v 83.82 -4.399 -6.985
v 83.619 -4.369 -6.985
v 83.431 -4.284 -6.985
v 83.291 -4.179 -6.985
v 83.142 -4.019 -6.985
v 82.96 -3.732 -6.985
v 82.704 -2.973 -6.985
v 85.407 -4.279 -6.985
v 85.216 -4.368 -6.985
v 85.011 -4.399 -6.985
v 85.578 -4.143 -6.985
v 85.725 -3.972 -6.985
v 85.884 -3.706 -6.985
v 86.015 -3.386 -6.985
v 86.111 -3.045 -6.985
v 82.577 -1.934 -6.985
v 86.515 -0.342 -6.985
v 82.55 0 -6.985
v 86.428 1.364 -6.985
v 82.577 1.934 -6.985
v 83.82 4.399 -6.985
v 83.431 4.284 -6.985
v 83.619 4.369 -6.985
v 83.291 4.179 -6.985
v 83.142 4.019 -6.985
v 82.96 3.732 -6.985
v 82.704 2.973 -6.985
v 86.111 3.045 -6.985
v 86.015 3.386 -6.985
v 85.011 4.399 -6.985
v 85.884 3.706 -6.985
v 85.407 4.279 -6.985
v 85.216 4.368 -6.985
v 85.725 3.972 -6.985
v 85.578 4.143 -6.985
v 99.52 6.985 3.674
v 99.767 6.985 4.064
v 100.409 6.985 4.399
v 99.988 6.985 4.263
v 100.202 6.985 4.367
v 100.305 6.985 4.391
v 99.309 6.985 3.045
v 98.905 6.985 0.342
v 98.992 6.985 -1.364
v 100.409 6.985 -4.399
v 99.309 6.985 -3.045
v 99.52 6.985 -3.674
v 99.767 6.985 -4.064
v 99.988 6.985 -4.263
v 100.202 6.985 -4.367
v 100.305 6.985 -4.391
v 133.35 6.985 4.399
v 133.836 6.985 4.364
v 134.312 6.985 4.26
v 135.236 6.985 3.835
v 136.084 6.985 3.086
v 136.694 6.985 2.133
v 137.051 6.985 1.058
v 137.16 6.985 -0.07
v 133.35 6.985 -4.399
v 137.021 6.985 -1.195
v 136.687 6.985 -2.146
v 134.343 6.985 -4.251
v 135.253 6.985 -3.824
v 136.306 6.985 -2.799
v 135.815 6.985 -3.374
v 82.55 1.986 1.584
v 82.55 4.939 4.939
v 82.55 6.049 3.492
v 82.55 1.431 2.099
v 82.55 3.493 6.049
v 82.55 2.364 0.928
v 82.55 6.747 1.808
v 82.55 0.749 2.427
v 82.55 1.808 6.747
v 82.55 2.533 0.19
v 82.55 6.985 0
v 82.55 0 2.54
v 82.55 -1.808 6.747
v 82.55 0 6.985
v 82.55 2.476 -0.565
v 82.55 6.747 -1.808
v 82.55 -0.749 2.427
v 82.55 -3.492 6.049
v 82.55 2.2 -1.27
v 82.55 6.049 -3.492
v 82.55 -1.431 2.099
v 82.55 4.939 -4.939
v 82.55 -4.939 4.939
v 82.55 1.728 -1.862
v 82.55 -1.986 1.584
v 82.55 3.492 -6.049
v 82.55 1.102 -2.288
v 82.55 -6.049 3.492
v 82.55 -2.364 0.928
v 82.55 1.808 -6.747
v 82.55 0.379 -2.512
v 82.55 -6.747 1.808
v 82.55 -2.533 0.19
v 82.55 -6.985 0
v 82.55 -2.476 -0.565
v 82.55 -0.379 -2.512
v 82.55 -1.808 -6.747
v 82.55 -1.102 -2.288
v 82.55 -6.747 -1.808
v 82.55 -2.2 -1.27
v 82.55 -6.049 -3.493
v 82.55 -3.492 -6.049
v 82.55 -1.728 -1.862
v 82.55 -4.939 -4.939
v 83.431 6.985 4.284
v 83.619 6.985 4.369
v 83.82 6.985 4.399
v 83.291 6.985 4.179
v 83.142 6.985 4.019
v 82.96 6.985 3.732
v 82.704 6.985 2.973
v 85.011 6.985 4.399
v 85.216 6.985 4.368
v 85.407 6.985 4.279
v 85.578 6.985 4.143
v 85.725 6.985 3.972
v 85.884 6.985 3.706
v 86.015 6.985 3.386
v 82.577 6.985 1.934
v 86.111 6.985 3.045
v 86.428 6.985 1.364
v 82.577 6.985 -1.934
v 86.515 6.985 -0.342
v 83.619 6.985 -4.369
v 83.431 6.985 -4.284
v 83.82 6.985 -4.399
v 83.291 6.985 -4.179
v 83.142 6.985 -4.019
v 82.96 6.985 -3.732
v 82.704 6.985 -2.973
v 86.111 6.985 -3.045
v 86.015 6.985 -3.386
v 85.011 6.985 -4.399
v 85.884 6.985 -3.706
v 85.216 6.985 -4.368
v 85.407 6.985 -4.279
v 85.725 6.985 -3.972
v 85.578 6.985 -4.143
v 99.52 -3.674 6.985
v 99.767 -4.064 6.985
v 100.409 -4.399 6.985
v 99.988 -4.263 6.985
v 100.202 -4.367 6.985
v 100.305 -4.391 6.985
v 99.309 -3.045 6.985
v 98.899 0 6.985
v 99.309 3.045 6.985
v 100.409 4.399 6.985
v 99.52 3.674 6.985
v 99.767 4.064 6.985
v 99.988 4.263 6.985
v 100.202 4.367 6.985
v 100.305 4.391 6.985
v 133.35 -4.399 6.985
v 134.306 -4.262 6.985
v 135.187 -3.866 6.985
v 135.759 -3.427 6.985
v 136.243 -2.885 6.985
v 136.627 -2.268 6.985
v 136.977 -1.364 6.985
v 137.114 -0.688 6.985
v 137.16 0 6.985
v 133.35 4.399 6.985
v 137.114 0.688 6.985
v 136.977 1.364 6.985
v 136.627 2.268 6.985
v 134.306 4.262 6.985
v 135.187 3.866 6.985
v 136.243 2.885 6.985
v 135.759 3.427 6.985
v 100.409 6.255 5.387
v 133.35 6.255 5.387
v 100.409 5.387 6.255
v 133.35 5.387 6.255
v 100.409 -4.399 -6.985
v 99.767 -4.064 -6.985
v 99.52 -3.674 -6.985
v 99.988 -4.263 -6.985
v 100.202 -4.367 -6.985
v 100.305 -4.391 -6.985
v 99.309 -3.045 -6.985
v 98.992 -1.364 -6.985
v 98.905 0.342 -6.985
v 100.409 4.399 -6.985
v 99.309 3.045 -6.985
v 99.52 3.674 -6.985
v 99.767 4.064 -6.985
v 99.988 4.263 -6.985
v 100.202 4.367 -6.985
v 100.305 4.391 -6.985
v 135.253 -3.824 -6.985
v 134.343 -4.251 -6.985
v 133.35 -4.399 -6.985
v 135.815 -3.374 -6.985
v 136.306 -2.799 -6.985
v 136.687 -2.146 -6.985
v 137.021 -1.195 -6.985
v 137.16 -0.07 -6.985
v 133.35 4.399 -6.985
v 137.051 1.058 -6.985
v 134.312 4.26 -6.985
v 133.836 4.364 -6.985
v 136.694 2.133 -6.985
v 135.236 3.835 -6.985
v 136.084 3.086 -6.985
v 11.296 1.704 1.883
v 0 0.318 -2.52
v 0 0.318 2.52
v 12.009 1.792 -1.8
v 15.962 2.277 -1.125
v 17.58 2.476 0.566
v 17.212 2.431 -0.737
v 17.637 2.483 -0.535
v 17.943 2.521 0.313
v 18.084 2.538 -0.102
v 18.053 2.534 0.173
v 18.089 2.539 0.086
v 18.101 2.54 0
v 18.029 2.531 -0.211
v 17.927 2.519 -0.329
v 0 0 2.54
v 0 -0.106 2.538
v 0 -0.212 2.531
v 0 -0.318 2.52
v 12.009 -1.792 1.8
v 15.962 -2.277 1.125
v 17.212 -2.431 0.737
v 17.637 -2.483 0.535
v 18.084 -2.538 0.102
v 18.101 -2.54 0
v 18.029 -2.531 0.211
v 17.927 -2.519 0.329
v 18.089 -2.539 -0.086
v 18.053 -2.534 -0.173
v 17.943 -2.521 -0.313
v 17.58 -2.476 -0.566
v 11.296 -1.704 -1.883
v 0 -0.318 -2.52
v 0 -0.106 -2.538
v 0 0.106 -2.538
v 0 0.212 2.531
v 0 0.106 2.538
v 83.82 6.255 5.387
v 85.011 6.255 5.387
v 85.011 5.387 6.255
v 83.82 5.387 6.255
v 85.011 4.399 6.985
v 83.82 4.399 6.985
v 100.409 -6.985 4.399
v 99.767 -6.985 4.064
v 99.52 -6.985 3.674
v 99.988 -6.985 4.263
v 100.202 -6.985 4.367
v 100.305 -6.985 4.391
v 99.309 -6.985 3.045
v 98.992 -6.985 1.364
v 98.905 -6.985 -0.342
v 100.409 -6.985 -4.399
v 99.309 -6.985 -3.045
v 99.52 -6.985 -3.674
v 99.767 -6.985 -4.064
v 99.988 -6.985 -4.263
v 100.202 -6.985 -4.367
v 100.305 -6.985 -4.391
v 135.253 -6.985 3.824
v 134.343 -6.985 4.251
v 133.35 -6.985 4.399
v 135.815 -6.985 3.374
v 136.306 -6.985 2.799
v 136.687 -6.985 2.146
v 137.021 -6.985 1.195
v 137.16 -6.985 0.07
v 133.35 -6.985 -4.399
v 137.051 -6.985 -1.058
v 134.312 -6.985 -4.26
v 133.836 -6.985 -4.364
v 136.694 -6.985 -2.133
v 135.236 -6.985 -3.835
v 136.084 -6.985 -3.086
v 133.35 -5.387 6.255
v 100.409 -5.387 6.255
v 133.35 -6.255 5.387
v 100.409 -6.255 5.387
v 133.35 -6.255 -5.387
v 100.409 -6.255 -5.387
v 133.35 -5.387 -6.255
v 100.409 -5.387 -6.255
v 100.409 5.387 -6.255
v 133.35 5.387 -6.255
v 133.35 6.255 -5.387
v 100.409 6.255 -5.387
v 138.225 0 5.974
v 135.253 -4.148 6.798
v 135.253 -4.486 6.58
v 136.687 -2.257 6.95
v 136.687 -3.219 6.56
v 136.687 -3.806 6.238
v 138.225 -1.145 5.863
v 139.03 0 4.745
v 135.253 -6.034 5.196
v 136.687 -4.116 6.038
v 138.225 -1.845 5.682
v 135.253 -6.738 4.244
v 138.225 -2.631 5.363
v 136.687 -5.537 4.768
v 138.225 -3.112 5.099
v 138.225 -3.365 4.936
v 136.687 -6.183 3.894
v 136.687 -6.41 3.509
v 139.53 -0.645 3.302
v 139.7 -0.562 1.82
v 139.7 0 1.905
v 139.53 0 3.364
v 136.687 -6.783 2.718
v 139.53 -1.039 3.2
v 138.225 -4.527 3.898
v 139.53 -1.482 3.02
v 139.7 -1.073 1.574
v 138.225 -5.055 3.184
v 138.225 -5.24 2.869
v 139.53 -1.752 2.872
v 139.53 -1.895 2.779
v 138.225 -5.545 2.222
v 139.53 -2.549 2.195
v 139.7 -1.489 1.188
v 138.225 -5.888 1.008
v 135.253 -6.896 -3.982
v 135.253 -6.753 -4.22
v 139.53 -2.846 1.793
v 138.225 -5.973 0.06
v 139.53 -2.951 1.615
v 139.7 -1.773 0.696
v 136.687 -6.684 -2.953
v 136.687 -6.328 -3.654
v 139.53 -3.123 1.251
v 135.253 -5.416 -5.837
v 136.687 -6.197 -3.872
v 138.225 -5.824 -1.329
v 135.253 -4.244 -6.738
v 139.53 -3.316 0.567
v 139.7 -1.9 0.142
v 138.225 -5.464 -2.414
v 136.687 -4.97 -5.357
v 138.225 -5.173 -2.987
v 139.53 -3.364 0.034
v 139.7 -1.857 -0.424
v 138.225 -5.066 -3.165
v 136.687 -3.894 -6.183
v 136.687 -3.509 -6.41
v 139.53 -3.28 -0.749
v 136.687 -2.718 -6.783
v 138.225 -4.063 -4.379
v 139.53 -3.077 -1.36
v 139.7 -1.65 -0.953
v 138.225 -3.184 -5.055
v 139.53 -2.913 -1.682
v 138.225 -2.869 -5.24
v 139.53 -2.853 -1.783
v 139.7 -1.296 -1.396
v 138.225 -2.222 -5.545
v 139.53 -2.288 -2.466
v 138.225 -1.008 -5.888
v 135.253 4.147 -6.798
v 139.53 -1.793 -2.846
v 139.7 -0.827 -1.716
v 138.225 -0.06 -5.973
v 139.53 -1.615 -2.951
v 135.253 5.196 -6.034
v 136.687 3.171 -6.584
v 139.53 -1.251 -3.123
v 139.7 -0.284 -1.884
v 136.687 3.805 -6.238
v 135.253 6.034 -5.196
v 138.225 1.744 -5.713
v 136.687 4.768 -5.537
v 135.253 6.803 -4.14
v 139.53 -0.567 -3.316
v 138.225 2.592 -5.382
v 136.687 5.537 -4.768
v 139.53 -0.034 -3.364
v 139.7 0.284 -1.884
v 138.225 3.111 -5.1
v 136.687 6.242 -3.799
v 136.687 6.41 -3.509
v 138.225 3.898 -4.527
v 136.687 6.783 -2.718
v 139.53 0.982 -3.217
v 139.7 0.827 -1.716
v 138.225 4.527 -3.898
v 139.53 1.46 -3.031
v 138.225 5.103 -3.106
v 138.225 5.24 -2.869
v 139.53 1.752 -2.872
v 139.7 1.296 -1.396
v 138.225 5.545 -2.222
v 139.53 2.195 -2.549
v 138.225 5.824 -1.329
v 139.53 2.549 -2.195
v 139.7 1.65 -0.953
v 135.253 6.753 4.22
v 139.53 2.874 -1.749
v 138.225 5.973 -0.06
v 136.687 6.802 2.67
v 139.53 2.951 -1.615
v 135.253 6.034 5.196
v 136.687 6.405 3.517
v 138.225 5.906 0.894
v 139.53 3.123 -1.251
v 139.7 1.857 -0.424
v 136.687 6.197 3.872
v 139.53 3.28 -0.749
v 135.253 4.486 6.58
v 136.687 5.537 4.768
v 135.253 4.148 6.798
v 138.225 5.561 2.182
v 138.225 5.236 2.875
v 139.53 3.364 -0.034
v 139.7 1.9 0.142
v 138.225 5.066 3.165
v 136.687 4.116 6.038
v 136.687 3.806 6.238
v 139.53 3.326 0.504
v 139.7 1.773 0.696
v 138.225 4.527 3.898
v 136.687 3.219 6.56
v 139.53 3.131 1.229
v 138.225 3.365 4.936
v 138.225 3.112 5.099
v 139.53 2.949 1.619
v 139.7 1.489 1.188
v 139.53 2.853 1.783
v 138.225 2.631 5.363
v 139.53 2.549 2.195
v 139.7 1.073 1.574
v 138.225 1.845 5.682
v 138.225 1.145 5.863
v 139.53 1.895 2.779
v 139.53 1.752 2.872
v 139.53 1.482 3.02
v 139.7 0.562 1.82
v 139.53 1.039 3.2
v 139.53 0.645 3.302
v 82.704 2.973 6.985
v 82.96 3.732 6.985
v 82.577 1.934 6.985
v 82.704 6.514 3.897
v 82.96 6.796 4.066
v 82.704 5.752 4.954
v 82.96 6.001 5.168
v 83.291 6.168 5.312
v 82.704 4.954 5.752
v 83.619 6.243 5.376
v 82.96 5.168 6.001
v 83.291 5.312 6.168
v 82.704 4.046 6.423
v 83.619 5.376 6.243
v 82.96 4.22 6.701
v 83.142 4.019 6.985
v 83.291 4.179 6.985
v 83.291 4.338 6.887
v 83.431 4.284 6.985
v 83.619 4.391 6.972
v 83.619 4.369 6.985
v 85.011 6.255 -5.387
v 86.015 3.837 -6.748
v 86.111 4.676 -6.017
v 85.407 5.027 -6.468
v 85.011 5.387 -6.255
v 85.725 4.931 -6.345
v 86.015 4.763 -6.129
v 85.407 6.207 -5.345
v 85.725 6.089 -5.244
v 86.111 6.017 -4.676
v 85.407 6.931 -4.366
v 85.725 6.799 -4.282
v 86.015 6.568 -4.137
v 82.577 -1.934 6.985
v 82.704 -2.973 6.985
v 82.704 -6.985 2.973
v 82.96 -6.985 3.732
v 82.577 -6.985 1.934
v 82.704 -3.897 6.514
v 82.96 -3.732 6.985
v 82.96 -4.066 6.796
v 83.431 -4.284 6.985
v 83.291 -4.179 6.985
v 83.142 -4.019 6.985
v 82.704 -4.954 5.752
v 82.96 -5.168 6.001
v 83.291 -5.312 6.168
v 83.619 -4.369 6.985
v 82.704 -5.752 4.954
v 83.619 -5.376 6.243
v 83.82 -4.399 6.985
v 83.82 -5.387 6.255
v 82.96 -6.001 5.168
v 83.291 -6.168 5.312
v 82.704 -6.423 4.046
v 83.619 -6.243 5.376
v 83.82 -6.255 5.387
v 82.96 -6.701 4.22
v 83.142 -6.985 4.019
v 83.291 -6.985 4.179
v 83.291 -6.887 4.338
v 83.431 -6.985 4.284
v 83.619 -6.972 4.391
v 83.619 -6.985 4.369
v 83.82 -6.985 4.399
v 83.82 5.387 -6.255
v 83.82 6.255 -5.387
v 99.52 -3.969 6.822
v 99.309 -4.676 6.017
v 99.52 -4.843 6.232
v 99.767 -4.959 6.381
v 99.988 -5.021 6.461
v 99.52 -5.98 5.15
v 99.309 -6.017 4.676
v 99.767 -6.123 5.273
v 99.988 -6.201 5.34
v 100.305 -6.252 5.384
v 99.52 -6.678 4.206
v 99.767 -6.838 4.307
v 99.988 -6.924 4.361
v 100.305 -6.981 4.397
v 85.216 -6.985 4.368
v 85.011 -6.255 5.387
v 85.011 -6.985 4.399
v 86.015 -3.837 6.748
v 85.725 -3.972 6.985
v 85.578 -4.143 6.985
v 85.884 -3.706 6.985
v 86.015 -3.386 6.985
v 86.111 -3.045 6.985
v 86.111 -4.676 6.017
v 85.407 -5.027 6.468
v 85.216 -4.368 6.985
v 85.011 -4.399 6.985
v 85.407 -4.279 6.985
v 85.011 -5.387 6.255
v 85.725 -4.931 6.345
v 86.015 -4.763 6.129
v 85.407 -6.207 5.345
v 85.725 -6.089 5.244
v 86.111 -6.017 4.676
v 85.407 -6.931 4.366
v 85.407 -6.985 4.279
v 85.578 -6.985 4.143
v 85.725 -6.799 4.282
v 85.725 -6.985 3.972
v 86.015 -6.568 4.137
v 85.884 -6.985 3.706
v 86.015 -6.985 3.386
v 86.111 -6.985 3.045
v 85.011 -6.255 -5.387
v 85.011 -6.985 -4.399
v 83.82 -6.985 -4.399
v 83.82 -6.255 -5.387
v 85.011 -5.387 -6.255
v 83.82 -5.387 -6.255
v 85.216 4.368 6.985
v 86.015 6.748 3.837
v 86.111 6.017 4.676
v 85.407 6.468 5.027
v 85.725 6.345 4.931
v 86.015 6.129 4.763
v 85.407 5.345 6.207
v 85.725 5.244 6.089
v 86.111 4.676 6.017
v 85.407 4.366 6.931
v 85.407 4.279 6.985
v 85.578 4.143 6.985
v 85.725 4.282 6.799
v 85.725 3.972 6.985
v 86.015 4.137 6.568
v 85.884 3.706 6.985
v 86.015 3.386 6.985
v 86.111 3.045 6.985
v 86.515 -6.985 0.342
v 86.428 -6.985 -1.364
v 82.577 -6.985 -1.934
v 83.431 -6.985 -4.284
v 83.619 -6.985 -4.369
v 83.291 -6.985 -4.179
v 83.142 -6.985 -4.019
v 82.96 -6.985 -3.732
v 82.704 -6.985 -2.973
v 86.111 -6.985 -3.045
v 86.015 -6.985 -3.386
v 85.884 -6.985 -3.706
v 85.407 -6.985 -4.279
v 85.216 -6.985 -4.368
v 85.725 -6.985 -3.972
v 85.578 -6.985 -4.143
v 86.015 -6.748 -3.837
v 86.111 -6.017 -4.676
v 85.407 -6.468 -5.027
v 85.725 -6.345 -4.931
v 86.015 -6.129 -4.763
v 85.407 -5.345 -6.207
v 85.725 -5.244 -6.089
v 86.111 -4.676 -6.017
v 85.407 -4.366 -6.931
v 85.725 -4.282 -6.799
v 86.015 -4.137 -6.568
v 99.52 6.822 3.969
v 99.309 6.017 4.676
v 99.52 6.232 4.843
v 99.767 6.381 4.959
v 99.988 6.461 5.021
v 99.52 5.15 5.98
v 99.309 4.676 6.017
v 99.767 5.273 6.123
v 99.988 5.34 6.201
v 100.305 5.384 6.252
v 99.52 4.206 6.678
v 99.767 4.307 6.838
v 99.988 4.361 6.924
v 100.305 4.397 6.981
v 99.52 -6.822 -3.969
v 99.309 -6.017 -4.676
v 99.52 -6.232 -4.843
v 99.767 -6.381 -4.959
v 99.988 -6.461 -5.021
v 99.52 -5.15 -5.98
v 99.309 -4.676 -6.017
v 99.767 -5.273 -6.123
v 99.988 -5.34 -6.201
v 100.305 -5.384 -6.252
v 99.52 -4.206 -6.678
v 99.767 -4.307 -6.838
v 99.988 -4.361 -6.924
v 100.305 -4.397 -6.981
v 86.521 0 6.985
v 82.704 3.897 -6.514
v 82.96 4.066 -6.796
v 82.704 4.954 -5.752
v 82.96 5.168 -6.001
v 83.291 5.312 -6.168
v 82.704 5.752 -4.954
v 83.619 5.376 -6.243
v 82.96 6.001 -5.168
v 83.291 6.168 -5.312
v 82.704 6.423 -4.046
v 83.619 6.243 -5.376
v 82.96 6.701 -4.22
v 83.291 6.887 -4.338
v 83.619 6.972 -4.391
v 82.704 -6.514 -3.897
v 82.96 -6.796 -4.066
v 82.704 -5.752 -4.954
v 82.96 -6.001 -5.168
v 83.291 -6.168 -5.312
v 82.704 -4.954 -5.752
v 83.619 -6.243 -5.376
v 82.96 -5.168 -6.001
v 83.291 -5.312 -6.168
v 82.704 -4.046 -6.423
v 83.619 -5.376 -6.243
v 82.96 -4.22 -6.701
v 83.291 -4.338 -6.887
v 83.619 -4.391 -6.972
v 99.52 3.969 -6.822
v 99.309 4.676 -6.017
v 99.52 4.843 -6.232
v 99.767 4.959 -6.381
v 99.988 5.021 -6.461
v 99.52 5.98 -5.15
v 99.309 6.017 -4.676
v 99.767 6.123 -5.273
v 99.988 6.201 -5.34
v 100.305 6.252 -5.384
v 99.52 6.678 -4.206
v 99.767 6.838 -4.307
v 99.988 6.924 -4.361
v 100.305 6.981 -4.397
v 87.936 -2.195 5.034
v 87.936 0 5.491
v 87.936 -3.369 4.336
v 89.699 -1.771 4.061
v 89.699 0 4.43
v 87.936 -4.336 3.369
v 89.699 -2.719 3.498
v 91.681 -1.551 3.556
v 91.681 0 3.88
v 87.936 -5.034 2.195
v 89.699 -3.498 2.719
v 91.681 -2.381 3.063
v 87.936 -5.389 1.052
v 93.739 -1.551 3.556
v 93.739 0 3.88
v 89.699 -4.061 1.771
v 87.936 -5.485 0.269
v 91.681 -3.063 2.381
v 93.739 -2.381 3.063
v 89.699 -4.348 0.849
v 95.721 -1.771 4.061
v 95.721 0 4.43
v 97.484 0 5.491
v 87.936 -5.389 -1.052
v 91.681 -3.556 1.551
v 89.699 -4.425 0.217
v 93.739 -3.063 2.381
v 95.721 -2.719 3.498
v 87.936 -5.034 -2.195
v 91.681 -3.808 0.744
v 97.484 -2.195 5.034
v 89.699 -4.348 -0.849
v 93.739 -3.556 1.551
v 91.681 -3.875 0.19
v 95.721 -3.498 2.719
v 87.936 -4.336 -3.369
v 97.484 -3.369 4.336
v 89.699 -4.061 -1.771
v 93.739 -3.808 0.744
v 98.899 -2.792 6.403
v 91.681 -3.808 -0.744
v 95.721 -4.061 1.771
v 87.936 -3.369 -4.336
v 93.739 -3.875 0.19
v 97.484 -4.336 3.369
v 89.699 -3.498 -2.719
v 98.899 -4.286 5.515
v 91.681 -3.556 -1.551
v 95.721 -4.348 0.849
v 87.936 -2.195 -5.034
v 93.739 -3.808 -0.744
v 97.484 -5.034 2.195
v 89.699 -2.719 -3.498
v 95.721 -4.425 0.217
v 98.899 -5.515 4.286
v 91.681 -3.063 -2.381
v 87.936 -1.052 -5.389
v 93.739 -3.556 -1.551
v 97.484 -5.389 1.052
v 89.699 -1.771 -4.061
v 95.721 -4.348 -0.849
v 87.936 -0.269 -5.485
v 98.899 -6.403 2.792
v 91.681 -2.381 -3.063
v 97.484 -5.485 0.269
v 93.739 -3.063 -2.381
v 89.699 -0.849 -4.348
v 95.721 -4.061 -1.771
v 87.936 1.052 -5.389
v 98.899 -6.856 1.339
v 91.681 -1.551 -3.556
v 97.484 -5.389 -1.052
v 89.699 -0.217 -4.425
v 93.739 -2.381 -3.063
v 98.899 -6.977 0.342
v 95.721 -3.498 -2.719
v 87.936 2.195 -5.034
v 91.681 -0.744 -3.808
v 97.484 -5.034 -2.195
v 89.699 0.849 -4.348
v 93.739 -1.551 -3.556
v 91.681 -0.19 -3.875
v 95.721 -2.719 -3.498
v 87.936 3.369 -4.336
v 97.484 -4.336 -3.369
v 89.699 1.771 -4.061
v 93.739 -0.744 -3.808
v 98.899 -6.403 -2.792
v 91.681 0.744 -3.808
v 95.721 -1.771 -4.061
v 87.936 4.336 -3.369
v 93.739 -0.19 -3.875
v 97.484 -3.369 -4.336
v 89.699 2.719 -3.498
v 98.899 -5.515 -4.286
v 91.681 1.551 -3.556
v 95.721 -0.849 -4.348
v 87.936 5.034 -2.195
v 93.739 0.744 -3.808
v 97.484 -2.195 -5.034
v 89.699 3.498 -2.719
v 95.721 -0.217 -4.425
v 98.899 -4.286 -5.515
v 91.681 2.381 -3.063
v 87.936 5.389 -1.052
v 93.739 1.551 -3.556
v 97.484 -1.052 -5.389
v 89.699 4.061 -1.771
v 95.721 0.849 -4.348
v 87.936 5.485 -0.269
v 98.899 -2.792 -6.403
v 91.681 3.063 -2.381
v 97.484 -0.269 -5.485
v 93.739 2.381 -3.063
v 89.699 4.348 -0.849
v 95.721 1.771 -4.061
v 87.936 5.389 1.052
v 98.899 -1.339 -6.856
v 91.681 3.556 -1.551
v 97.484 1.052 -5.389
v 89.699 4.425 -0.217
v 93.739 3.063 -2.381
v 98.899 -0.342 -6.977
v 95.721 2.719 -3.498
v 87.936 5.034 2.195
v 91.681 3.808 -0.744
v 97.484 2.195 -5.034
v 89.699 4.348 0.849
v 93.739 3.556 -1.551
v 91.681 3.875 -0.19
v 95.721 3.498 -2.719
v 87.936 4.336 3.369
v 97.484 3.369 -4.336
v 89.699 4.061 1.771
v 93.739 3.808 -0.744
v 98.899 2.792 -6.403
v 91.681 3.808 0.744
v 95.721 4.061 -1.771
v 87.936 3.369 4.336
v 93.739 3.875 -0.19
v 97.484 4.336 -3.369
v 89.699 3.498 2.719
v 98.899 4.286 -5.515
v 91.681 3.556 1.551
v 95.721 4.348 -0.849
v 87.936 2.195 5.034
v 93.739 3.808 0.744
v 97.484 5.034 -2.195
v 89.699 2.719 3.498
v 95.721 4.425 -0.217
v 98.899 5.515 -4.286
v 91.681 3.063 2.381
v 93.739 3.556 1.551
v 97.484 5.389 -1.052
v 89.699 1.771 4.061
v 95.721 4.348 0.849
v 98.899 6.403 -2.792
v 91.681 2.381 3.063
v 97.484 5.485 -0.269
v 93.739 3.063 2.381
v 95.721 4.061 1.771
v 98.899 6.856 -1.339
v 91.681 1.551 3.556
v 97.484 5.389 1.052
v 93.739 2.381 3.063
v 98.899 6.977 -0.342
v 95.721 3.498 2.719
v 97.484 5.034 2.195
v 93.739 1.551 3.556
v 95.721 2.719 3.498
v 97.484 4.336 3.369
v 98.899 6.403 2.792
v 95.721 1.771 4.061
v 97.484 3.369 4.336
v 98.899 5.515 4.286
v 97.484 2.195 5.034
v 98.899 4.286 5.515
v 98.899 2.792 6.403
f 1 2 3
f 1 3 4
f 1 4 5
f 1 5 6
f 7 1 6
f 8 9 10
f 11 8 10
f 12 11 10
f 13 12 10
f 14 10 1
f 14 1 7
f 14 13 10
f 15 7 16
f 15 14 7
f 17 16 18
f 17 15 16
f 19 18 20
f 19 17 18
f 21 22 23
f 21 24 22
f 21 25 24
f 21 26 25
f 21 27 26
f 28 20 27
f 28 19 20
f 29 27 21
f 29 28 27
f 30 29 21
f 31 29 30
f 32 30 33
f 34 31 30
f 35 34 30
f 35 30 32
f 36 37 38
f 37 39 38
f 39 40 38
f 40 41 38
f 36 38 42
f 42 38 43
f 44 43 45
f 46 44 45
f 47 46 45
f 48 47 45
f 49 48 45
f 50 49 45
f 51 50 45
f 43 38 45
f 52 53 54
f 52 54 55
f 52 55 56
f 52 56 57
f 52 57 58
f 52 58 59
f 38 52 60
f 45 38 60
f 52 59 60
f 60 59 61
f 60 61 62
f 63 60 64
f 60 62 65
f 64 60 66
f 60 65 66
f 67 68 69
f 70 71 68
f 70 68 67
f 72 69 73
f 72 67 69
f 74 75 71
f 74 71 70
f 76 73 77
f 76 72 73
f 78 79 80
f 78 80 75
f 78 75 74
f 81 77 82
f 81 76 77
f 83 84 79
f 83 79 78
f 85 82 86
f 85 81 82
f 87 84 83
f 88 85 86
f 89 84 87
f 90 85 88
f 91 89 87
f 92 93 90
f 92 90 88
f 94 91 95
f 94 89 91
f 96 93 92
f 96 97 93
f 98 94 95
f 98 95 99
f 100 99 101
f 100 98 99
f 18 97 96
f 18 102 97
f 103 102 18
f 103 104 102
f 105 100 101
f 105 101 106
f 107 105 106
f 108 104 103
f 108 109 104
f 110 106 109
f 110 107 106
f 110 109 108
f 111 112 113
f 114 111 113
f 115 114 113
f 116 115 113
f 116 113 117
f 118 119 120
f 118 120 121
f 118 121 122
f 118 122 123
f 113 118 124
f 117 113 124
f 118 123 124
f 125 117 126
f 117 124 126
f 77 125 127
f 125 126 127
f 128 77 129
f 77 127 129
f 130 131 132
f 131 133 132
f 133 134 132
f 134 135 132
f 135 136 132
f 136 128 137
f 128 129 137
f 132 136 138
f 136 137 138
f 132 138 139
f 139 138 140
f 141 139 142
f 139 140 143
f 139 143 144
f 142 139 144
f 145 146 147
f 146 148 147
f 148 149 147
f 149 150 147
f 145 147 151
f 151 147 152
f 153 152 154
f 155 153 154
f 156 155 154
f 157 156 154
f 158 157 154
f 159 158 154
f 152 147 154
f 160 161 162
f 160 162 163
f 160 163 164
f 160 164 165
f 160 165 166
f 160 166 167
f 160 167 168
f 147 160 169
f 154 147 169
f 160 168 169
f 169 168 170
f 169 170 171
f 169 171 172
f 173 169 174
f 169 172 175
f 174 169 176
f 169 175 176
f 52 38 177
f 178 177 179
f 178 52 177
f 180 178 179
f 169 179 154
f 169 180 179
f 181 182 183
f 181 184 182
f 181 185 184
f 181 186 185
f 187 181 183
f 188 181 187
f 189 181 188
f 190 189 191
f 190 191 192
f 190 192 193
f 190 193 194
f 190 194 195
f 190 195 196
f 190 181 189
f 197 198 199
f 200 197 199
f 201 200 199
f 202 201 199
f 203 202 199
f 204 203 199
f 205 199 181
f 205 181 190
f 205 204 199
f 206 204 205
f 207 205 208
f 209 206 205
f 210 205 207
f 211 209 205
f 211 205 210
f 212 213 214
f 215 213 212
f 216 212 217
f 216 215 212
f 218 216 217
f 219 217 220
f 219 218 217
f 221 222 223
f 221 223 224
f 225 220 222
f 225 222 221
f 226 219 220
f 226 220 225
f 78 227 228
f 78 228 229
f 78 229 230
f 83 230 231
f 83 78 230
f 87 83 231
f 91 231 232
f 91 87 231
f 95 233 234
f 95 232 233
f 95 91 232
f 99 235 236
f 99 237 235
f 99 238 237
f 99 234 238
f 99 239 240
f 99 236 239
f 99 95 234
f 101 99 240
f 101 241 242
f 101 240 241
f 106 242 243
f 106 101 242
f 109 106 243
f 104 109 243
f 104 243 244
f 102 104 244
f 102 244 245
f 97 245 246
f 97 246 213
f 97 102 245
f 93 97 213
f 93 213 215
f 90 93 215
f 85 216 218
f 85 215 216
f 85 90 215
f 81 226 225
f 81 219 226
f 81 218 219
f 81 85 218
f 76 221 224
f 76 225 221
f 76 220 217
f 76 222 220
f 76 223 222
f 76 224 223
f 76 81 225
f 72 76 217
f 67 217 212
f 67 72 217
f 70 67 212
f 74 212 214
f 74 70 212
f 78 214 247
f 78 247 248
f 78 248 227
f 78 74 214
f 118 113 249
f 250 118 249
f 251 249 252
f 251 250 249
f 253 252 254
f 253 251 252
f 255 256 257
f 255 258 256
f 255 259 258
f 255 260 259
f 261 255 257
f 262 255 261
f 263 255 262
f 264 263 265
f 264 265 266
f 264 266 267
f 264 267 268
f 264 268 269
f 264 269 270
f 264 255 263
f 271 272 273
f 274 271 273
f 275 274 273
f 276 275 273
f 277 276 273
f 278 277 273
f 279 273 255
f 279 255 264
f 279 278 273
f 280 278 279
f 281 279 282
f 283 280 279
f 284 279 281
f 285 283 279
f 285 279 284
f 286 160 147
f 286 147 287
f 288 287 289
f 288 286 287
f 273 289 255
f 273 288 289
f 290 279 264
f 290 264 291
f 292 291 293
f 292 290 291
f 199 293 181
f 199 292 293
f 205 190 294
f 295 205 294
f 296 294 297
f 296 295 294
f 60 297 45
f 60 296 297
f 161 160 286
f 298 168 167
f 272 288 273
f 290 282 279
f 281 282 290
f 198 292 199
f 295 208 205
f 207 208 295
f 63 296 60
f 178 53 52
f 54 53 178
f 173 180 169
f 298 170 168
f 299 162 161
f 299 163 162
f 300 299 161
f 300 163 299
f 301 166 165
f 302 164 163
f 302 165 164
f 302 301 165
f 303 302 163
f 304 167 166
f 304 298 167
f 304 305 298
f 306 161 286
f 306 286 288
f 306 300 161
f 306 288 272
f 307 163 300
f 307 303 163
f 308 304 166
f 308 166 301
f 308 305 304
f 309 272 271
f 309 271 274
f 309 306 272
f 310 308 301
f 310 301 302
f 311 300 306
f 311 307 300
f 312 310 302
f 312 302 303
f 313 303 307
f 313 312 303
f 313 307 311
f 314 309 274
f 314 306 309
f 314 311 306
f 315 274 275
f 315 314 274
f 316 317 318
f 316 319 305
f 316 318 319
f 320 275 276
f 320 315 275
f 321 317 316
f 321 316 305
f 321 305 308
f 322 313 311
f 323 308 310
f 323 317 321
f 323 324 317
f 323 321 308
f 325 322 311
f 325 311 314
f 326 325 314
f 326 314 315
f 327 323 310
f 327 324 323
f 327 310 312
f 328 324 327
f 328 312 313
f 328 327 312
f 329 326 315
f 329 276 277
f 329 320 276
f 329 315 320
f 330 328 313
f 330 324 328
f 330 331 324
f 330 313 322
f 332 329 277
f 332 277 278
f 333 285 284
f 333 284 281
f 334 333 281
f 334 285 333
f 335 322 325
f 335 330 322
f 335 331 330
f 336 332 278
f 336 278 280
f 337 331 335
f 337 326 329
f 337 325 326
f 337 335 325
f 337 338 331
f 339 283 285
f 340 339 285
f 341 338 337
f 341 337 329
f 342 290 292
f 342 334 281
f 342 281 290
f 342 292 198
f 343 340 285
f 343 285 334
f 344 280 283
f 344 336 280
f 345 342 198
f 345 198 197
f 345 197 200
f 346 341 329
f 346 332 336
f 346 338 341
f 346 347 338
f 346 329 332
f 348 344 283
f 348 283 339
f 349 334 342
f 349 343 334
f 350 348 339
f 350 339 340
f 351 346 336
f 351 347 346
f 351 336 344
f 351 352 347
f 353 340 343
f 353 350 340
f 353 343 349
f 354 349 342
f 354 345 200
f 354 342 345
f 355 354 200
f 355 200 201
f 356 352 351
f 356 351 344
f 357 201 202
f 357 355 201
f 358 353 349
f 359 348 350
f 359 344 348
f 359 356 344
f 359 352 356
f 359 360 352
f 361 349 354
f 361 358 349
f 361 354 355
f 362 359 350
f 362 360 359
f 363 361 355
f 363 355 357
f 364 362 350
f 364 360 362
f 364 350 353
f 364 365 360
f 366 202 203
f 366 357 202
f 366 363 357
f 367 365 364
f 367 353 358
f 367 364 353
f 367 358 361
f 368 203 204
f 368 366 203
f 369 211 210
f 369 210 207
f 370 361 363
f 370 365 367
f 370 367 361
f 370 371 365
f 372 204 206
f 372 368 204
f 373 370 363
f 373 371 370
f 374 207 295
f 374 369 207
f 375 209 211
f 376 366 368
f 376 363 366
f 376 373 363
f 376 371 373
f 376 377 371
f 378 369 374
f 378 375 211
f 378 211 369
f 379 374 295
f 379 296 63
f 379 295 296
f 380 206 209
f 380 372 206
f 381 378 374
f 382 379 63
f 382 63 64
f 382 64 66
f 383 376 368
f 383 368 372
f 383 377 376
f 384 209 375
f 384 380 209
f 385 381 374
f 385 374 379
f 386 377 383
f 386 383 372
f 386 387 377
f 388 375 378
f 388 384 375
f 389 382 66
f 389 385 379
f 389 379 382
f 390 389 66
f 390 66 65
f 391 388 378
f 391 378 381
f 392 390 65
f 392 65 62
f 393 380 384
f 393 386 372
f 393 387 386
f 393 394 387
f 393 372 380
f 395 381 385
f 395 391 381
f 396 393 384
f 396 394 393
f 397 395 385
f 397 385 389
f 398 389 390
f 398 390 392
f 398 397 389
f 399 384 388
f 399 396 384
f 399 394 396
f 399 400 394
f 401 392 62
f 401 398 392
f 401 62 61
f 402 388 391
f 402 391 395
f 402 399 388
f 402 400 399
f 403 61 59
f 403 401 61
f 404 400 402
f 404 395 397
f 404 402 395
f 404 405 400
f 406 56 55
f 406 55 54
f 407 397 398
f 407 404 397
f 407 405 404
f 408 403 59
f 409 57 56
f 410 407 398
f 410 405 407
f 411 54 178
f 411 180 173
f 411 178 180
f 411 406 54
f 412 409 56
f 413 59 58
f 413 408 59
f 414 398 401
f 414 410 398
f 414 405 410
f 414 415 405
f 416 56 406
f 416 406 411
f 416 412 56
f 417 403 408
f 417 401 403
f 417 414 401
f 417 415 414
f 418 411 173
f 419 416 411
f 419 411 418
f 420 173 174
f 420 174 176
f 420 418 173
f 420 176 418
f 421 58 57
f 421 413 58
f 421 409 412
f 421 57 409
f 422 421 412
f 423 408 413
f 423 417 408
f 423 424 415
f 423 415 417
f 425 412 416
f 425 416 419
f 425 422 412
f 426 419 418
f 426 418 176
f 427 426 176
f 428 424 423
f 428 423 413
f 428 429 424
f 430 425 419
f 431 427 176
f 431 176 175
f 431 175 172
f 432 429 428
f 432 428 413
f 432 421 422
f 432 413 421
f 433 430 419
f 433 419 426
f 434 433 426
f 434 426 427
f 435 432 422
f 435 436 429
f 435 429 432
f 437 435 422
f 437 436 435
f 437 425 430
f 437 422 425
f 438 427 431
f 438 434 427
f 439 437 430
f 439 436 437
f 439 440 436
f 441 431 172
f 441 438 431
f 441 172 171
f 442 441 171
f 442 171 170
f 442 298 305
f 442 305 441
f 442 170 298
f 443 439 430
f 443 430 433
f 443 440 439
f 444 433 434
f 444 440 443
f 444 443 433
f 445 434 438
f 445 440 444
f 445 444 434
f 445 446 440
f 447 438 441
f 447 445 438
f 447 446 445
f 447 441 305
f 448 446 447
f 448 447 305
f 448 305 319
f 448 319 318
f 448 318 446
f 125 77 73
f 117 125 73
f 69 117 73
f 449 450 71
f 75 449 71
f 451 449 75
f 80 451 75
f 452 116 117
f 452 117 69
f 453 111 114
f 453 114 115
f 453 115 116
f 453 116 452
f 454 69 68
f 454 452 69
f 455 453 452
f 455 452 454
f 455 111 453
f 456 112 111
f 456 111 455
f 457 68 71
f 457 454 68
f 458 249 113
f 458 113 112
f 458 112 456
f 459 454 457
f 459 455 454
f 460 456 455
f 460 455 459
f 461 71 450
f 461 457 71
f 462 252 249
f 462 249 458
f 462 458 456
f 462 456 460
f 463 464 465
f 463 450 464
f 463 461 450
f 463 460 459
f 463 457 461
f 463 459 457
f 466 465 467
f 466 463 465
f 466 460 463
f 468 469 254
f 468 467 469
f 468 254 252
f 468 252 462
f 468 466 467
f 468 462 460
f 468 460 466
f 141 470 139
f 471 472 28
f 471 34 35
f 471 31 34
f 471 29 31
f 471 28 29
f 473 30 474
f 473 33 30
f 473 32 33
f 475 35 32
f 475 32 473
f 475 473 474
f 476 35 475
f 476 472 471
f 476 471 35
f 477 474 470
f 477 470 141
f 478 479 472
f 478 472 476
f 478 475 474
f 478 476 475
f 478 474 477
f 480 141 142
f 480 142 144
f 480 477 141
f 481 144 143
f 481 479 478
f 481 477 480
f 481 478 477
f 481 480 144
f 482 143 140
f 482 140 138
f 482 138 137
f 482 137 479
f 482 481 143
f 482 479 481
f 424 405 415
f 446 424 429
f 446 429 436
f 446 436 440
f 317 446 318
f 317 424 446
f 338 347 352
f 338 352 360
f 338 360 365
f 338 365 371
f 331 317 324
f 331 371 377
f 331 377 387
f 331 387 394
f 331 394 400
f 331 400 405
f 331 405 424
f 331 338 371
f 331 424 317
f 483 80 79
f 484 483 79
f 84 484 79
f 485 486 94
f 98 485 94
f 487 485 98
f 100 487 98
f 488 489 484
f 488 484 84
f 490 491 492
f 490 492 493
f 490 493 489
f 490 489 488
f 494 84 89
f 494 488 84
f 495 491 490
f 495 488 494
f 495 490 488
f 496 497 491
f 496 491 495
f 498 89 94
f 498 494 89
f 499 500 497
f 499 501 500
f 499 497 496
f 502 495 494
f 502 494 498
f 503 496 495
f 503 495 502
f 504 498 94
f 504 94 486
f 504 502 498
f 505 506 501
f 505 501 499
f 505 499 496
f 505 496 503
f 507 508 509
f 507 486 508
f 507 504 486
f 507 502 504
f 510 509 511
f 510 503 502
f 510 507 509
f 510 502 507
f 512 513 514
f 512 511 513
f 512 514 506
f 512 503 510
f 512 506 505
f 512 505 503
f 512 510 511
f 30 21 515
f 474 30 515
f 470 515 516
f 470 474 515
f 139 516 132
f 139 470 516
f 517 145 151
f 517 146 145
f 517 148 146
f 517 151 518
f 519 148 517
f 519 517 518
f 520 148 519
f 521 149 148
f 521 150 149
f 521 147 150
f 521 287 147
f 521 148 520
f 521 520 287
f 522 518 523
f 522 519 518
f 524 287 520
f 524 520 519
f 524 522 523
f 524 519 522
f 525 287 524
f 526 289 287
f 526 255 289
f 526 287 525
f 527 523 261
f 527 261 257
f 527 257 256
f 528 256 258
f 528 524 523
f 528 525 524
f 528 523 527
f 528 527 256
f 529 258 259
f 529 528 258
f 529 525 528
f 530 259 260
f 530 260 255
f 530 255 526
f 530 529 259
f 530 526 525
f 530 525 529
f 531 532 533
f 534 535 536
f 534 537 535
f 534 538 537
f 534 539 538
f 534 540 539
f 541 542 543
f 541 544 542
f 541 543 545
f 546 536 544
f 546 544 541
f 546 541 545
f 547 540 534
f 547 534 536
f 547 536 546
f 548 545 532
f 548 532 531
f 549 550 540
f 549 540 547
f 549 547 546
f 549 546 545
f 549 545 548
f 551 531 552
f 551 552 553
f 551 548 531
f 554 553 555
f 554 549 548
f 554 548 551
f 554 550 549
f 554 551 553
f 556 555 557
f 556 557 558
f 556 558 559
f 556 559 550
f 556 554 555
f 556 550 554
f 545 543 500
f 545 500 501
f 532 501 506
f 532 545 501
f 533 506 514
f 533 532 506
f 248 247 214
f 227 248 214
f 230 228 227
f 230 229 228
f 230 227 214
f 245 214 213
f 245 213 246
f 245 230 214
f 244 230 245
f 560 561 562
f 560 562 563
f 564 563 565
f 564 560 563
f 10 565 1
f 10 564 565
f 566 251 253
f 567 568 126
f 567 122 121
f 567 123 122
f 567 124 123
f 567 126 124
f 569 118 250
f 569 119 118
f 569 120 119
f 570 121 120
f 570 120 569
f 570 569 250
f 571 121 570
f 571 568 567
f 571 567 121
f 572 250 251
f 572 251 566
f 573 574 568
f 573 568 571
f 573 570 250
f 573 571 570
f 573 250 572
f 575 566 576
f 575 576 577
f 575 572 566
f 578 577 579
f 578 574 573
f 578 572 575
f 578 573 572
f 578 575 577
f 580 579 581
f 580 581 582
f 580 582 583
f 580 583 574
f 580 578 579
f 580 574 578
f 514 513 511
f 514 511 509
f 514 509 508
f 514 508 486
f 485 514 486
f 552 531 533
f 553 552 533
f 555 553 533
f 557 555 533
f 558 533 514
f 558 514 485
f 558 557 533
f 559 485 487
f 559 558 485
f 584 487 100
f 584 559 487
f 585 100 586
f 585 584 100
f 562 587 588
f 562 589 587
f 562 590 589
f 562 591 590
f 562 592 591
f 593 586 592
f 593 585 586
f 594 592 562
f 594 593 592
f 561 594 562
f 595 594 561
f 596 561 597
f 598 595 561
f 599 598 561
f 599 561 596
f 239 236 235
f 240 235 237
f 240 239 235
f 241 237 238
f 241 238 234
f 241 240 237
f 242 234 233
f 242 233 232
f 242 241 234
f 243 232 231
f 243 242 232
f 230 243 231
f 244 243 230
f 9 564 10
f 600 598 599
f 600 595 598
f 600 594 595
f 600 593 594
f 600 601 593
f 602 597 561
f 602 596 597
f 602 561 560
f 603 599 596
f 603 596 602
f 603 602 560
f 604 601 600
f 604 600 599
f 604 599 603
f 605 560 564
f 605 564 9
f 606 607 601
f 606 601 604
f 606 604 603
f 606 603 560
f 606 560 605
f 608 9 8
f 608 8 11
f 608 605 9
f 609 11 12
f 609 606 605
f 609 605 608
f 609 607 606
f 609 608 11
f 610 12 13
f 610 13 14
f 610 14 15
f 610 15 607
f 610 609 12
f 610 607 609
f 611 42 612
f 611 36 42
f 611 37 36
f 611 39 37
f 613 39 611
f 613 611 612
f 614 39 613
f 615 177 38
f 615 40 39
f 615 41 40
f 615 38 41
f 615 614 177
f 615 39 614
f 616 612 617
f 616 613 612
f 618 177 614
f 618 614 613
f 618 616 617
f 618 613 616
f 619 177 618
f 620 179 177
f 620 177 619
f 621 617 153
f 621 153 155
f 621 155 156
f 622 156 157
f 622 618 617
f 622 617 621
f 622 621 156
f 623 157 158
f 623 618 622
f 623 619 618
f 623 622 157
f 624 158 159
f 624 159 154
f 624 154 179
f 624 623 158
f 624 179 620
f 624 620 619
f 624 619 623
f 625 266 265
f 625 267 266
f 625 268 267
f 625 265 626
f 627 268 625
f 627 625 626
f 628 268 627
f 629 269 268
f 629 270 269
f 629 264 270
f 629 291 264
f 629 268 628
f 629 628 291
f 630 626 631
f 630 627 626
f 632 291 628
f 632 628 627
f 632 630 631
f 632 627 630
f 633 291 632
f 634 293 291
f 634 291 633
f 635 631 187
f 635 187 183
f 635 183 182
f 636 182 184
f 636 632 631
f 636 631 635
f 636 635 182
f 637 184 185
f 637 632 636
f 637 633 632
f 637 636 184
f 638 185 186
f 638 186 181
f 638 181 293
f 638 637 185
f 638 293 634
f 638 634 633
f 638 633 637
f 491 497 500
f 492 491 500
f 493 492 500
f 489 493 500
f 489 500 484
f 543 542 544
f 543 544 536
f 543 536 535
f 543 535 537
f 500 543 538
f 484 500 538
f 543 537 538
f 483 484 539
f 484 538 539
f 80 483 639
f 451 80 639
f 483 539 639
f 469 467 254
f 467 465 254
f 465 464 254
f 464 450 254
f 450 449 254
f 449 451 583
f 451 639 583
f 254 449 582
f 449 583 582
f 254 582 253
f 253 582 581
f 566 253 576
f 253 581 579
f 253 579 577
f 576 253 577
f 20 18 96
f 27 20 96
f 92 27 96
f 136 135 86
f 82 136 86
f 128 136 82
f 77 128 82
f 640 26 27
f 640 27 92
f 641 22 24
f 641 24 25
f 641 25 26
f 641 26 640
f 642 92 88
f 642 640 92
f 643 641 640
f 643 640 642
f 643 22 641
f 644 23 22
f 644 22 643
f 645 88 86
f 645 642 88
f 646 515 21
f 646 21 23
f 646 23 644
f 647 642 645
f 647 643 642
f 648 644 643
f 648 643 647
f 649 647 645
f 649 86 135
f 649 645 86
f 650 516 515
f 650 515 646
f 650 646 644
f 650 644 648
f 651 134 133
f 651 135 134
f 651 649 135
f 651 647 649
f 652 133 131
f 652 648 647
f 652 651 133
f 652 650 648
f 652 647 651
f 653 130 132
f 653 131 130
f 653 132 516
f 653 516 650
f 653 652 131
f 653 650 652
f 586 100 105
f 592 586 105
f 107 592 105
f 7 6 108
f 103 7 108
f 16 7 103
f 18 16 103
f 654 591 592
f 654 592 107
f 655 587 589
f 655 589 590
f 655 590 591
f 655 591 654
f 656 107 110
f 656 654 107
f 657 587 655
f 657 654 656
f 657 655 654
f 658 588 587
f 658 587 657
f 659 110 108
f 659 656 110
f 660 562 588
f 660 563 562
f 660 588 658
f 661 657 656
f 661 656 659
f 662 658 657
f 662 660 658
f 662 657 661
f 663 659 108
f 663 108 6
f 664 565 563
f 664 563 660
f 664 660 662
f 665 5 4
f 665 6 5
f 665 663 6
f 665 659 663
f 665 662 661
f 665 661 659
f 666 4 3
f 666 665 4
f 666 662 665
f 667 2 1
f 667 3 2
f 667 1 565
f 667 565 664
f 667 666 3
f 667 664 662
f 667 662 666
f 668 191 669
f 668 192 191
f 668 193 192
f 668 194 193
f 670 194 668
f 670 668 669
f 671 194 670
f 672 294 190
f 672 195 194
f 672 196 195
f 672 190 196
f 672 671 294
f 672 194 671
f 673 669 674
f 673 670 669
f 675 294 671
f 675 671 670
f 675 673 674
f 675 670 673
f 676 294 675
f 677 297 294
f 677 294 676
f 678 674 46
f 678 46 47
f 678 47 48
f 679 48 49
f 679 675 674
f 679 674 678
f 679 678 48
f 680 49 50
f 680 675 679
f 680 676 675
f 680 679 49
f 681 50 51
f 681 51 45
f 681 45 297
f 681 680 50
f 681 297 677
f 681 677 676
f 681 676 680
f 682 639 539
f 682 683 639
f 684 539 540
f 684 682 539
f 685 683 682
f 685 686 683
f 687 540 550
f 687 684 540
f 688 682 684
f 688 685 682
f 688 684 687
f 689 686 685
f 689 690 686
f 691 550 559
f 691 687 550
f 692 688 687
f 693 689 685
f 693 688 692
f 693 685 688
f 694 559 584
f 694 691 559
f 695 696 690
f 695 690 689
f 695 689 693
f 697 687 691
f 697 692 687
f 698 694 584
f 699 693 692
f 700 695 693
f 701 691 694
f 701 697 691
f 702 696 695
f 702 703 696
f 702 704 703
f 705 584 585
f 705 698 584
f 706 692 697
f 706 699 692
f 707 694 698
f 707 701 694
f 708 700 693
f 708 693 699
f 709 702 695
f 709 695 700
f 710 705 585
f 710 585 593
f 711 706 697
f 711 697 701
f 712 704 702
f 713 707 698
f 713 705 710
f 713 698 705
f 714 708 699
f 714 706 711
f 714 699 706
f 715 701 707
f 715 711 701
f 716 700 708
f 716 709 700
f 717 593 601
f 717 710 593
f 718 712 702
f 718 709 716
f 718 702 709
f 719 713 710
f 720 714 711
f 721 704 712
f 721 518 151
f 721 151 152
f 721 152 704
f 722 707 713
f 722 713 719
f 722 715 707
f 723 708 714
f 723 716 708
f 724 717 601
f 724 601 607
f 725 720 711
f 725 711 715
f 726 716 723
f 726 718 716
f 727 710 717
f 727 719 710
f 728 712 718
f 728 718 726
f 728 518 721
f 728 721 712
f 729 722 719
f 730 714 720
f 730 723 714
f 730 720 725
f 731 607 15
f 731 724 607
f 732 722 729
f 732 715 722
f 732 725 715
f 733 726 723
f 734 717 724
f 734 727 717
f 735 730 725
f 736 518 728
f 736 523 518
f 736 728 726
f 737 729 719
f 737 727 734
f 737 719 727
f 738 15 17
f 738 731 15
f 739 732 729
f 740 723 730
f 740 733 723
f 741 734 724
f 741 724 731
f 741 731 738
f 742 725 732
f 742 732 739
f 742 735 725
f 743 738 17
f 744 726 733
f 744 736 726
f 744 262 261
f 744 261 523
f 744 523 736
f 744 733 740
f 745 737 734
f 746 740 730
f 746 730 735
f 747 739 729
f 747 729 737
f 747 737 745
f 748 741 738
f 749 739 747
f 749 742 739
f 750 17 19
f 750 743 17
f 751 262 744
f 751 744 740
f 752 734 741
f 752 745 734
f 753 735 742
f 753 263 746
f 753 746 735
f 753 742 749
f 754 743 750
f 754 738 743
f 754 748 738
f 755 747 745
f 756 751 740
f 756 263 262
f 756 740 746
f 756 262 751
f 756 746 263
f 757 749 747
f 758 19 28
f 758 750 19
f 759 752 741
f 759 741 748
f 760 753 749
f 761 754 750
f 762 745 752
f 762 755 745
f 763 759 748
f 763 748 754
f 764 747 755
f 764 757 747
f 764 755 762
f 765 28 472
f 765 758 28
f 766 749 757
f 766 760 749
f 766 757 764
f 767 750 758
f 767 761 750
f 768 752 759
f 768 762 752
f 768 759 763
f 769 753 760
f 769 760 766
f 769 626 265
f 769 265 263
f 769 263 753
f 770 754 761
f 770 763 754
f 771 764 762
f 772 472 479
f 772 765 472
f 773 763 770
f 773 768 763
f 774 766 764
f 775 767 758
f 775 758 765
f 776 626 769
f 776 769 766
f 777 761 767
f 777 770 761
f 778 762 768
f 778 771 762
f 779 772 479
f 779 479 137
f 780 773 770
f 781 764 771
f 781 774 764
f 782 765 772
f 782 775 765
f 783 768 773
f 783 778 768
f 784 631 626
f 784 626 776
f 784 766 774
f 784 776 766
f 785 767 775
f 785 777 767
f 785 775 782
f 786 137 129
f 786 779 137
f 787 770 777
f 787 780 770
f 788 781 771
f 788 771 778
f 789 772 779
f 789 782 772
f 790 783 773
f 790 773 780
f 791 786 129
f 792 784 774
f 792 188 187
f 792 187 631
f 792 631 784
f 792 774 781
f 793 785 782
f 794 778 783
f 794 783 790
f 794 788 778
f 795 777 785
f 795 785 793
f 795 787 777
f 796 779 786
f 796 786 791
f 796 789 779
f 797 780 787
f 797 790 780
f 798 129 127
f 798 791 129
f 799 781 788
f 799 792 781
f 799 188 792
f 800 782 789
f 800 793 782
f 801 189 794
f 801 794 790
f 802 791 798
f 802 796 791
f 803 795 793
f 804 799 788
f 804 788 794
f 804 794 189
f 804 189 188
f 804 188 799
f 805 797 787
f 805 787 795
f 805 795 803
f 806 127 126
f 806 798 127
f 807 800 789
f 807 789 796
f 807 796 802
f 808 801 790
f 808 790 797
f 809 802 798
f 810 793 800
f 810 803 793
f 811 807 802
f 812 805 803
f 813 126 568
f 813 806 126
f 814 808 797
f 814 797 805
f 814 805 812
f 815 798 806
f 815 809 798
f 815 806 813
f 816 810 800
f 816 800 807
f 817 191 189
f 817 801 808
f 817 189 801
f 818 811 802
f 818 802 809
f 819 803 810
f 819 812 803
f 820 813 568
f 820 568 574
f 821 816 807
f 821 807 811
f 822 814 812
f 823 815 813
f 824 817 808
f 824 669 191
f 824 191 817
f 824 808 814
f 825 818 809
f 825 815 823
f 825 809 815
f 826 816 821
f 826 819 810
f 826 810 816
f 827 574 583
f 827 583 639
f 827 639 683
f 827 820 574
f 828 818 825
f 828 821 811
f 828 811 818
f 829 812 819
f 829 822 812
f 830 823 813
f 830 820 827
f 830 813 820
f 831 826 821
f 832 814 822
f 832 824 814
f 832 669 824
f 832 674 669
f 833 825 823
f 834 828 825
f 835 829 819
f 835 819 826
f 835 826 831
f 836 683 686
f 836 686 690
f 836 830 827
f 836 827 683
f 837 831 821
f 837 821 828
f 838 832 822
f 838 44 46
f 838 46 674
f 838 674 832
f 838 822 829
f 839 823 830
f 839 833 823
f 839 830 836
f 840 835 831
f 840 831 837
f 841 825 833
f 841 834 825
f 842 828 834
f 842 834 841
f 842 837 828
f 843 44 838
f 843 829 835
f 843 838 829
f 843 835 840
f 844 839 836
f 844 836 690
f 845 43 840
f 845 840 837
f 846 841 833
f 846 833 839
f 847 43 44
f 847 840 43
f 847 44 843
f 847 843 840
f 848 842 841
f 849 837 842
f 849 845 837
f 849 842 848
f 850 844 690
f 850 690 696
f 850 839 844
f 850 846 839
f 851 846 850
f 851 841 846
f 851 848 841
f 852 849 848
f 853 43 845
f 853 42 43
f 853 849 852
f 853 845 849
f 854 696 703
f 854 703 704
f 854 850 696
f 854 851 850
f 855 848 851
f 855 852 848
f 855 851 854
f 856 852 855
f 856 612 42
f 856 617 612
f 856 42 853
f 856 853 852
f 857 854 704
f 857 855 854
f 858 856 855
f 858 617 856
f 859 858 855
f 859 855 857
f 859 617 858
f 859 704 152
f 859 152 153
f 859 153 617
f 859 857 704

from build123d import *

# Parameters (mm, degrees)
CUT_EXTRUDE3_DEPTH      = 141.1869469
CUT_EXTRUDE3_DEPTH_BACK = 141.1869469
SKETCH8_OUTSIDE_W       = 46.838
SKETCH8_OUTSIDE_H       = 46.838
SKETCH8_OUTSIDE_W_2     = 13.97
SKETCH8_OUTSIDE_H_2     = 13.97
CUT_EXTRUDE4_DEPTH      = 141.186946801


with BuildPart() as part:
    # Sketch1 → Revolve3 (revolve)
    with BuildSketch(Plane.XY, mode=Mode.PRIVATE) as revolve3_sk:
        with BuildLine():
            Line((0, 0), (0, 2.54))
            Line((0, 2.54), (82.55, 2.54))
            Line((82.55, 2.54), (82.55, 6.985))
            ThreePointArc((82.55, 6.985), (82.921974388, 7.883025612), (83.82, 8.255))
            Line((83.82, 8.255), (85.01103416, 8.255))
            ThreePointArc((85.01103416, 8.255), (85.64603416, 8.084852263), (86.110886423, 7.62))
            ThreePointArc((86.110886423, 7.62), (92.71, 3.81), (99.309113577, 7.62))
            ThreePointArc((99.309113577, 7.62), (99.77396584, 8.084852263), (100.40896584, 8.255))
            Line((100.40896584, 8.255), (133.35, 8.255))
            ThreePointArc((133.35, 8.255), (137.840128061, 6.395128061), (139.7, 1.905))
            Line((139.7, 1.905), (139.7, 0))
            Line((139.7, 0), (0, 0))
        make_face()
    revolve(revolve3_sk.sketch.rotate(Axis((-862.051792103, 0, 0), (1, 0, 0)), 90), axis=Axis((-862.051792103, 0, 0), (1, 0, 0)))

    # Sketch5 → Cut-Extrude3 (cut, two sides: drawn at the far end of the back side and taken through both)
    with BuildSketch(Plane.XY.offset(-CUT_EXTRUDE3_DEPTH_BACK)):
        Polygon((270.361206931, -33.513682078), (18.100809936, -2.54), (0, -0.3175), (0, 0.3175), (18.100809936, 2.54), (270.361206931, 33.513682078), (-237.948450162, 33.513682078), (-237.948450162, -33.513682078), align=None)
    extrude(amount=CUT_EXTRUDE3_DEPTH + CUT_EXTRUDE3_DEPTH_BACK, mode=Mode.SUBTRACT)

    # Sketch8 outside → Cut-Extrude4 (cut, through all)
    with BuildSketch(Plane(origin=(139.7, 0, 0), x_dir=(0, 0, -1), z_dir=(1, 0, 0))):
        Rectangle(SKETCH8_OUTSIDE_W, SKETCH8_OUTSIDE_H)
        Rectangle(SKETCH8_OUTSIDE_W_2, SKETCH8_OUTSIDE_H_2, mode=Mode.SUBTRACT)
    extrude(amount=-CUT_EXTRUDE4_DEPTH, mode=Mode.SUBTRACT)


solid = part.part
